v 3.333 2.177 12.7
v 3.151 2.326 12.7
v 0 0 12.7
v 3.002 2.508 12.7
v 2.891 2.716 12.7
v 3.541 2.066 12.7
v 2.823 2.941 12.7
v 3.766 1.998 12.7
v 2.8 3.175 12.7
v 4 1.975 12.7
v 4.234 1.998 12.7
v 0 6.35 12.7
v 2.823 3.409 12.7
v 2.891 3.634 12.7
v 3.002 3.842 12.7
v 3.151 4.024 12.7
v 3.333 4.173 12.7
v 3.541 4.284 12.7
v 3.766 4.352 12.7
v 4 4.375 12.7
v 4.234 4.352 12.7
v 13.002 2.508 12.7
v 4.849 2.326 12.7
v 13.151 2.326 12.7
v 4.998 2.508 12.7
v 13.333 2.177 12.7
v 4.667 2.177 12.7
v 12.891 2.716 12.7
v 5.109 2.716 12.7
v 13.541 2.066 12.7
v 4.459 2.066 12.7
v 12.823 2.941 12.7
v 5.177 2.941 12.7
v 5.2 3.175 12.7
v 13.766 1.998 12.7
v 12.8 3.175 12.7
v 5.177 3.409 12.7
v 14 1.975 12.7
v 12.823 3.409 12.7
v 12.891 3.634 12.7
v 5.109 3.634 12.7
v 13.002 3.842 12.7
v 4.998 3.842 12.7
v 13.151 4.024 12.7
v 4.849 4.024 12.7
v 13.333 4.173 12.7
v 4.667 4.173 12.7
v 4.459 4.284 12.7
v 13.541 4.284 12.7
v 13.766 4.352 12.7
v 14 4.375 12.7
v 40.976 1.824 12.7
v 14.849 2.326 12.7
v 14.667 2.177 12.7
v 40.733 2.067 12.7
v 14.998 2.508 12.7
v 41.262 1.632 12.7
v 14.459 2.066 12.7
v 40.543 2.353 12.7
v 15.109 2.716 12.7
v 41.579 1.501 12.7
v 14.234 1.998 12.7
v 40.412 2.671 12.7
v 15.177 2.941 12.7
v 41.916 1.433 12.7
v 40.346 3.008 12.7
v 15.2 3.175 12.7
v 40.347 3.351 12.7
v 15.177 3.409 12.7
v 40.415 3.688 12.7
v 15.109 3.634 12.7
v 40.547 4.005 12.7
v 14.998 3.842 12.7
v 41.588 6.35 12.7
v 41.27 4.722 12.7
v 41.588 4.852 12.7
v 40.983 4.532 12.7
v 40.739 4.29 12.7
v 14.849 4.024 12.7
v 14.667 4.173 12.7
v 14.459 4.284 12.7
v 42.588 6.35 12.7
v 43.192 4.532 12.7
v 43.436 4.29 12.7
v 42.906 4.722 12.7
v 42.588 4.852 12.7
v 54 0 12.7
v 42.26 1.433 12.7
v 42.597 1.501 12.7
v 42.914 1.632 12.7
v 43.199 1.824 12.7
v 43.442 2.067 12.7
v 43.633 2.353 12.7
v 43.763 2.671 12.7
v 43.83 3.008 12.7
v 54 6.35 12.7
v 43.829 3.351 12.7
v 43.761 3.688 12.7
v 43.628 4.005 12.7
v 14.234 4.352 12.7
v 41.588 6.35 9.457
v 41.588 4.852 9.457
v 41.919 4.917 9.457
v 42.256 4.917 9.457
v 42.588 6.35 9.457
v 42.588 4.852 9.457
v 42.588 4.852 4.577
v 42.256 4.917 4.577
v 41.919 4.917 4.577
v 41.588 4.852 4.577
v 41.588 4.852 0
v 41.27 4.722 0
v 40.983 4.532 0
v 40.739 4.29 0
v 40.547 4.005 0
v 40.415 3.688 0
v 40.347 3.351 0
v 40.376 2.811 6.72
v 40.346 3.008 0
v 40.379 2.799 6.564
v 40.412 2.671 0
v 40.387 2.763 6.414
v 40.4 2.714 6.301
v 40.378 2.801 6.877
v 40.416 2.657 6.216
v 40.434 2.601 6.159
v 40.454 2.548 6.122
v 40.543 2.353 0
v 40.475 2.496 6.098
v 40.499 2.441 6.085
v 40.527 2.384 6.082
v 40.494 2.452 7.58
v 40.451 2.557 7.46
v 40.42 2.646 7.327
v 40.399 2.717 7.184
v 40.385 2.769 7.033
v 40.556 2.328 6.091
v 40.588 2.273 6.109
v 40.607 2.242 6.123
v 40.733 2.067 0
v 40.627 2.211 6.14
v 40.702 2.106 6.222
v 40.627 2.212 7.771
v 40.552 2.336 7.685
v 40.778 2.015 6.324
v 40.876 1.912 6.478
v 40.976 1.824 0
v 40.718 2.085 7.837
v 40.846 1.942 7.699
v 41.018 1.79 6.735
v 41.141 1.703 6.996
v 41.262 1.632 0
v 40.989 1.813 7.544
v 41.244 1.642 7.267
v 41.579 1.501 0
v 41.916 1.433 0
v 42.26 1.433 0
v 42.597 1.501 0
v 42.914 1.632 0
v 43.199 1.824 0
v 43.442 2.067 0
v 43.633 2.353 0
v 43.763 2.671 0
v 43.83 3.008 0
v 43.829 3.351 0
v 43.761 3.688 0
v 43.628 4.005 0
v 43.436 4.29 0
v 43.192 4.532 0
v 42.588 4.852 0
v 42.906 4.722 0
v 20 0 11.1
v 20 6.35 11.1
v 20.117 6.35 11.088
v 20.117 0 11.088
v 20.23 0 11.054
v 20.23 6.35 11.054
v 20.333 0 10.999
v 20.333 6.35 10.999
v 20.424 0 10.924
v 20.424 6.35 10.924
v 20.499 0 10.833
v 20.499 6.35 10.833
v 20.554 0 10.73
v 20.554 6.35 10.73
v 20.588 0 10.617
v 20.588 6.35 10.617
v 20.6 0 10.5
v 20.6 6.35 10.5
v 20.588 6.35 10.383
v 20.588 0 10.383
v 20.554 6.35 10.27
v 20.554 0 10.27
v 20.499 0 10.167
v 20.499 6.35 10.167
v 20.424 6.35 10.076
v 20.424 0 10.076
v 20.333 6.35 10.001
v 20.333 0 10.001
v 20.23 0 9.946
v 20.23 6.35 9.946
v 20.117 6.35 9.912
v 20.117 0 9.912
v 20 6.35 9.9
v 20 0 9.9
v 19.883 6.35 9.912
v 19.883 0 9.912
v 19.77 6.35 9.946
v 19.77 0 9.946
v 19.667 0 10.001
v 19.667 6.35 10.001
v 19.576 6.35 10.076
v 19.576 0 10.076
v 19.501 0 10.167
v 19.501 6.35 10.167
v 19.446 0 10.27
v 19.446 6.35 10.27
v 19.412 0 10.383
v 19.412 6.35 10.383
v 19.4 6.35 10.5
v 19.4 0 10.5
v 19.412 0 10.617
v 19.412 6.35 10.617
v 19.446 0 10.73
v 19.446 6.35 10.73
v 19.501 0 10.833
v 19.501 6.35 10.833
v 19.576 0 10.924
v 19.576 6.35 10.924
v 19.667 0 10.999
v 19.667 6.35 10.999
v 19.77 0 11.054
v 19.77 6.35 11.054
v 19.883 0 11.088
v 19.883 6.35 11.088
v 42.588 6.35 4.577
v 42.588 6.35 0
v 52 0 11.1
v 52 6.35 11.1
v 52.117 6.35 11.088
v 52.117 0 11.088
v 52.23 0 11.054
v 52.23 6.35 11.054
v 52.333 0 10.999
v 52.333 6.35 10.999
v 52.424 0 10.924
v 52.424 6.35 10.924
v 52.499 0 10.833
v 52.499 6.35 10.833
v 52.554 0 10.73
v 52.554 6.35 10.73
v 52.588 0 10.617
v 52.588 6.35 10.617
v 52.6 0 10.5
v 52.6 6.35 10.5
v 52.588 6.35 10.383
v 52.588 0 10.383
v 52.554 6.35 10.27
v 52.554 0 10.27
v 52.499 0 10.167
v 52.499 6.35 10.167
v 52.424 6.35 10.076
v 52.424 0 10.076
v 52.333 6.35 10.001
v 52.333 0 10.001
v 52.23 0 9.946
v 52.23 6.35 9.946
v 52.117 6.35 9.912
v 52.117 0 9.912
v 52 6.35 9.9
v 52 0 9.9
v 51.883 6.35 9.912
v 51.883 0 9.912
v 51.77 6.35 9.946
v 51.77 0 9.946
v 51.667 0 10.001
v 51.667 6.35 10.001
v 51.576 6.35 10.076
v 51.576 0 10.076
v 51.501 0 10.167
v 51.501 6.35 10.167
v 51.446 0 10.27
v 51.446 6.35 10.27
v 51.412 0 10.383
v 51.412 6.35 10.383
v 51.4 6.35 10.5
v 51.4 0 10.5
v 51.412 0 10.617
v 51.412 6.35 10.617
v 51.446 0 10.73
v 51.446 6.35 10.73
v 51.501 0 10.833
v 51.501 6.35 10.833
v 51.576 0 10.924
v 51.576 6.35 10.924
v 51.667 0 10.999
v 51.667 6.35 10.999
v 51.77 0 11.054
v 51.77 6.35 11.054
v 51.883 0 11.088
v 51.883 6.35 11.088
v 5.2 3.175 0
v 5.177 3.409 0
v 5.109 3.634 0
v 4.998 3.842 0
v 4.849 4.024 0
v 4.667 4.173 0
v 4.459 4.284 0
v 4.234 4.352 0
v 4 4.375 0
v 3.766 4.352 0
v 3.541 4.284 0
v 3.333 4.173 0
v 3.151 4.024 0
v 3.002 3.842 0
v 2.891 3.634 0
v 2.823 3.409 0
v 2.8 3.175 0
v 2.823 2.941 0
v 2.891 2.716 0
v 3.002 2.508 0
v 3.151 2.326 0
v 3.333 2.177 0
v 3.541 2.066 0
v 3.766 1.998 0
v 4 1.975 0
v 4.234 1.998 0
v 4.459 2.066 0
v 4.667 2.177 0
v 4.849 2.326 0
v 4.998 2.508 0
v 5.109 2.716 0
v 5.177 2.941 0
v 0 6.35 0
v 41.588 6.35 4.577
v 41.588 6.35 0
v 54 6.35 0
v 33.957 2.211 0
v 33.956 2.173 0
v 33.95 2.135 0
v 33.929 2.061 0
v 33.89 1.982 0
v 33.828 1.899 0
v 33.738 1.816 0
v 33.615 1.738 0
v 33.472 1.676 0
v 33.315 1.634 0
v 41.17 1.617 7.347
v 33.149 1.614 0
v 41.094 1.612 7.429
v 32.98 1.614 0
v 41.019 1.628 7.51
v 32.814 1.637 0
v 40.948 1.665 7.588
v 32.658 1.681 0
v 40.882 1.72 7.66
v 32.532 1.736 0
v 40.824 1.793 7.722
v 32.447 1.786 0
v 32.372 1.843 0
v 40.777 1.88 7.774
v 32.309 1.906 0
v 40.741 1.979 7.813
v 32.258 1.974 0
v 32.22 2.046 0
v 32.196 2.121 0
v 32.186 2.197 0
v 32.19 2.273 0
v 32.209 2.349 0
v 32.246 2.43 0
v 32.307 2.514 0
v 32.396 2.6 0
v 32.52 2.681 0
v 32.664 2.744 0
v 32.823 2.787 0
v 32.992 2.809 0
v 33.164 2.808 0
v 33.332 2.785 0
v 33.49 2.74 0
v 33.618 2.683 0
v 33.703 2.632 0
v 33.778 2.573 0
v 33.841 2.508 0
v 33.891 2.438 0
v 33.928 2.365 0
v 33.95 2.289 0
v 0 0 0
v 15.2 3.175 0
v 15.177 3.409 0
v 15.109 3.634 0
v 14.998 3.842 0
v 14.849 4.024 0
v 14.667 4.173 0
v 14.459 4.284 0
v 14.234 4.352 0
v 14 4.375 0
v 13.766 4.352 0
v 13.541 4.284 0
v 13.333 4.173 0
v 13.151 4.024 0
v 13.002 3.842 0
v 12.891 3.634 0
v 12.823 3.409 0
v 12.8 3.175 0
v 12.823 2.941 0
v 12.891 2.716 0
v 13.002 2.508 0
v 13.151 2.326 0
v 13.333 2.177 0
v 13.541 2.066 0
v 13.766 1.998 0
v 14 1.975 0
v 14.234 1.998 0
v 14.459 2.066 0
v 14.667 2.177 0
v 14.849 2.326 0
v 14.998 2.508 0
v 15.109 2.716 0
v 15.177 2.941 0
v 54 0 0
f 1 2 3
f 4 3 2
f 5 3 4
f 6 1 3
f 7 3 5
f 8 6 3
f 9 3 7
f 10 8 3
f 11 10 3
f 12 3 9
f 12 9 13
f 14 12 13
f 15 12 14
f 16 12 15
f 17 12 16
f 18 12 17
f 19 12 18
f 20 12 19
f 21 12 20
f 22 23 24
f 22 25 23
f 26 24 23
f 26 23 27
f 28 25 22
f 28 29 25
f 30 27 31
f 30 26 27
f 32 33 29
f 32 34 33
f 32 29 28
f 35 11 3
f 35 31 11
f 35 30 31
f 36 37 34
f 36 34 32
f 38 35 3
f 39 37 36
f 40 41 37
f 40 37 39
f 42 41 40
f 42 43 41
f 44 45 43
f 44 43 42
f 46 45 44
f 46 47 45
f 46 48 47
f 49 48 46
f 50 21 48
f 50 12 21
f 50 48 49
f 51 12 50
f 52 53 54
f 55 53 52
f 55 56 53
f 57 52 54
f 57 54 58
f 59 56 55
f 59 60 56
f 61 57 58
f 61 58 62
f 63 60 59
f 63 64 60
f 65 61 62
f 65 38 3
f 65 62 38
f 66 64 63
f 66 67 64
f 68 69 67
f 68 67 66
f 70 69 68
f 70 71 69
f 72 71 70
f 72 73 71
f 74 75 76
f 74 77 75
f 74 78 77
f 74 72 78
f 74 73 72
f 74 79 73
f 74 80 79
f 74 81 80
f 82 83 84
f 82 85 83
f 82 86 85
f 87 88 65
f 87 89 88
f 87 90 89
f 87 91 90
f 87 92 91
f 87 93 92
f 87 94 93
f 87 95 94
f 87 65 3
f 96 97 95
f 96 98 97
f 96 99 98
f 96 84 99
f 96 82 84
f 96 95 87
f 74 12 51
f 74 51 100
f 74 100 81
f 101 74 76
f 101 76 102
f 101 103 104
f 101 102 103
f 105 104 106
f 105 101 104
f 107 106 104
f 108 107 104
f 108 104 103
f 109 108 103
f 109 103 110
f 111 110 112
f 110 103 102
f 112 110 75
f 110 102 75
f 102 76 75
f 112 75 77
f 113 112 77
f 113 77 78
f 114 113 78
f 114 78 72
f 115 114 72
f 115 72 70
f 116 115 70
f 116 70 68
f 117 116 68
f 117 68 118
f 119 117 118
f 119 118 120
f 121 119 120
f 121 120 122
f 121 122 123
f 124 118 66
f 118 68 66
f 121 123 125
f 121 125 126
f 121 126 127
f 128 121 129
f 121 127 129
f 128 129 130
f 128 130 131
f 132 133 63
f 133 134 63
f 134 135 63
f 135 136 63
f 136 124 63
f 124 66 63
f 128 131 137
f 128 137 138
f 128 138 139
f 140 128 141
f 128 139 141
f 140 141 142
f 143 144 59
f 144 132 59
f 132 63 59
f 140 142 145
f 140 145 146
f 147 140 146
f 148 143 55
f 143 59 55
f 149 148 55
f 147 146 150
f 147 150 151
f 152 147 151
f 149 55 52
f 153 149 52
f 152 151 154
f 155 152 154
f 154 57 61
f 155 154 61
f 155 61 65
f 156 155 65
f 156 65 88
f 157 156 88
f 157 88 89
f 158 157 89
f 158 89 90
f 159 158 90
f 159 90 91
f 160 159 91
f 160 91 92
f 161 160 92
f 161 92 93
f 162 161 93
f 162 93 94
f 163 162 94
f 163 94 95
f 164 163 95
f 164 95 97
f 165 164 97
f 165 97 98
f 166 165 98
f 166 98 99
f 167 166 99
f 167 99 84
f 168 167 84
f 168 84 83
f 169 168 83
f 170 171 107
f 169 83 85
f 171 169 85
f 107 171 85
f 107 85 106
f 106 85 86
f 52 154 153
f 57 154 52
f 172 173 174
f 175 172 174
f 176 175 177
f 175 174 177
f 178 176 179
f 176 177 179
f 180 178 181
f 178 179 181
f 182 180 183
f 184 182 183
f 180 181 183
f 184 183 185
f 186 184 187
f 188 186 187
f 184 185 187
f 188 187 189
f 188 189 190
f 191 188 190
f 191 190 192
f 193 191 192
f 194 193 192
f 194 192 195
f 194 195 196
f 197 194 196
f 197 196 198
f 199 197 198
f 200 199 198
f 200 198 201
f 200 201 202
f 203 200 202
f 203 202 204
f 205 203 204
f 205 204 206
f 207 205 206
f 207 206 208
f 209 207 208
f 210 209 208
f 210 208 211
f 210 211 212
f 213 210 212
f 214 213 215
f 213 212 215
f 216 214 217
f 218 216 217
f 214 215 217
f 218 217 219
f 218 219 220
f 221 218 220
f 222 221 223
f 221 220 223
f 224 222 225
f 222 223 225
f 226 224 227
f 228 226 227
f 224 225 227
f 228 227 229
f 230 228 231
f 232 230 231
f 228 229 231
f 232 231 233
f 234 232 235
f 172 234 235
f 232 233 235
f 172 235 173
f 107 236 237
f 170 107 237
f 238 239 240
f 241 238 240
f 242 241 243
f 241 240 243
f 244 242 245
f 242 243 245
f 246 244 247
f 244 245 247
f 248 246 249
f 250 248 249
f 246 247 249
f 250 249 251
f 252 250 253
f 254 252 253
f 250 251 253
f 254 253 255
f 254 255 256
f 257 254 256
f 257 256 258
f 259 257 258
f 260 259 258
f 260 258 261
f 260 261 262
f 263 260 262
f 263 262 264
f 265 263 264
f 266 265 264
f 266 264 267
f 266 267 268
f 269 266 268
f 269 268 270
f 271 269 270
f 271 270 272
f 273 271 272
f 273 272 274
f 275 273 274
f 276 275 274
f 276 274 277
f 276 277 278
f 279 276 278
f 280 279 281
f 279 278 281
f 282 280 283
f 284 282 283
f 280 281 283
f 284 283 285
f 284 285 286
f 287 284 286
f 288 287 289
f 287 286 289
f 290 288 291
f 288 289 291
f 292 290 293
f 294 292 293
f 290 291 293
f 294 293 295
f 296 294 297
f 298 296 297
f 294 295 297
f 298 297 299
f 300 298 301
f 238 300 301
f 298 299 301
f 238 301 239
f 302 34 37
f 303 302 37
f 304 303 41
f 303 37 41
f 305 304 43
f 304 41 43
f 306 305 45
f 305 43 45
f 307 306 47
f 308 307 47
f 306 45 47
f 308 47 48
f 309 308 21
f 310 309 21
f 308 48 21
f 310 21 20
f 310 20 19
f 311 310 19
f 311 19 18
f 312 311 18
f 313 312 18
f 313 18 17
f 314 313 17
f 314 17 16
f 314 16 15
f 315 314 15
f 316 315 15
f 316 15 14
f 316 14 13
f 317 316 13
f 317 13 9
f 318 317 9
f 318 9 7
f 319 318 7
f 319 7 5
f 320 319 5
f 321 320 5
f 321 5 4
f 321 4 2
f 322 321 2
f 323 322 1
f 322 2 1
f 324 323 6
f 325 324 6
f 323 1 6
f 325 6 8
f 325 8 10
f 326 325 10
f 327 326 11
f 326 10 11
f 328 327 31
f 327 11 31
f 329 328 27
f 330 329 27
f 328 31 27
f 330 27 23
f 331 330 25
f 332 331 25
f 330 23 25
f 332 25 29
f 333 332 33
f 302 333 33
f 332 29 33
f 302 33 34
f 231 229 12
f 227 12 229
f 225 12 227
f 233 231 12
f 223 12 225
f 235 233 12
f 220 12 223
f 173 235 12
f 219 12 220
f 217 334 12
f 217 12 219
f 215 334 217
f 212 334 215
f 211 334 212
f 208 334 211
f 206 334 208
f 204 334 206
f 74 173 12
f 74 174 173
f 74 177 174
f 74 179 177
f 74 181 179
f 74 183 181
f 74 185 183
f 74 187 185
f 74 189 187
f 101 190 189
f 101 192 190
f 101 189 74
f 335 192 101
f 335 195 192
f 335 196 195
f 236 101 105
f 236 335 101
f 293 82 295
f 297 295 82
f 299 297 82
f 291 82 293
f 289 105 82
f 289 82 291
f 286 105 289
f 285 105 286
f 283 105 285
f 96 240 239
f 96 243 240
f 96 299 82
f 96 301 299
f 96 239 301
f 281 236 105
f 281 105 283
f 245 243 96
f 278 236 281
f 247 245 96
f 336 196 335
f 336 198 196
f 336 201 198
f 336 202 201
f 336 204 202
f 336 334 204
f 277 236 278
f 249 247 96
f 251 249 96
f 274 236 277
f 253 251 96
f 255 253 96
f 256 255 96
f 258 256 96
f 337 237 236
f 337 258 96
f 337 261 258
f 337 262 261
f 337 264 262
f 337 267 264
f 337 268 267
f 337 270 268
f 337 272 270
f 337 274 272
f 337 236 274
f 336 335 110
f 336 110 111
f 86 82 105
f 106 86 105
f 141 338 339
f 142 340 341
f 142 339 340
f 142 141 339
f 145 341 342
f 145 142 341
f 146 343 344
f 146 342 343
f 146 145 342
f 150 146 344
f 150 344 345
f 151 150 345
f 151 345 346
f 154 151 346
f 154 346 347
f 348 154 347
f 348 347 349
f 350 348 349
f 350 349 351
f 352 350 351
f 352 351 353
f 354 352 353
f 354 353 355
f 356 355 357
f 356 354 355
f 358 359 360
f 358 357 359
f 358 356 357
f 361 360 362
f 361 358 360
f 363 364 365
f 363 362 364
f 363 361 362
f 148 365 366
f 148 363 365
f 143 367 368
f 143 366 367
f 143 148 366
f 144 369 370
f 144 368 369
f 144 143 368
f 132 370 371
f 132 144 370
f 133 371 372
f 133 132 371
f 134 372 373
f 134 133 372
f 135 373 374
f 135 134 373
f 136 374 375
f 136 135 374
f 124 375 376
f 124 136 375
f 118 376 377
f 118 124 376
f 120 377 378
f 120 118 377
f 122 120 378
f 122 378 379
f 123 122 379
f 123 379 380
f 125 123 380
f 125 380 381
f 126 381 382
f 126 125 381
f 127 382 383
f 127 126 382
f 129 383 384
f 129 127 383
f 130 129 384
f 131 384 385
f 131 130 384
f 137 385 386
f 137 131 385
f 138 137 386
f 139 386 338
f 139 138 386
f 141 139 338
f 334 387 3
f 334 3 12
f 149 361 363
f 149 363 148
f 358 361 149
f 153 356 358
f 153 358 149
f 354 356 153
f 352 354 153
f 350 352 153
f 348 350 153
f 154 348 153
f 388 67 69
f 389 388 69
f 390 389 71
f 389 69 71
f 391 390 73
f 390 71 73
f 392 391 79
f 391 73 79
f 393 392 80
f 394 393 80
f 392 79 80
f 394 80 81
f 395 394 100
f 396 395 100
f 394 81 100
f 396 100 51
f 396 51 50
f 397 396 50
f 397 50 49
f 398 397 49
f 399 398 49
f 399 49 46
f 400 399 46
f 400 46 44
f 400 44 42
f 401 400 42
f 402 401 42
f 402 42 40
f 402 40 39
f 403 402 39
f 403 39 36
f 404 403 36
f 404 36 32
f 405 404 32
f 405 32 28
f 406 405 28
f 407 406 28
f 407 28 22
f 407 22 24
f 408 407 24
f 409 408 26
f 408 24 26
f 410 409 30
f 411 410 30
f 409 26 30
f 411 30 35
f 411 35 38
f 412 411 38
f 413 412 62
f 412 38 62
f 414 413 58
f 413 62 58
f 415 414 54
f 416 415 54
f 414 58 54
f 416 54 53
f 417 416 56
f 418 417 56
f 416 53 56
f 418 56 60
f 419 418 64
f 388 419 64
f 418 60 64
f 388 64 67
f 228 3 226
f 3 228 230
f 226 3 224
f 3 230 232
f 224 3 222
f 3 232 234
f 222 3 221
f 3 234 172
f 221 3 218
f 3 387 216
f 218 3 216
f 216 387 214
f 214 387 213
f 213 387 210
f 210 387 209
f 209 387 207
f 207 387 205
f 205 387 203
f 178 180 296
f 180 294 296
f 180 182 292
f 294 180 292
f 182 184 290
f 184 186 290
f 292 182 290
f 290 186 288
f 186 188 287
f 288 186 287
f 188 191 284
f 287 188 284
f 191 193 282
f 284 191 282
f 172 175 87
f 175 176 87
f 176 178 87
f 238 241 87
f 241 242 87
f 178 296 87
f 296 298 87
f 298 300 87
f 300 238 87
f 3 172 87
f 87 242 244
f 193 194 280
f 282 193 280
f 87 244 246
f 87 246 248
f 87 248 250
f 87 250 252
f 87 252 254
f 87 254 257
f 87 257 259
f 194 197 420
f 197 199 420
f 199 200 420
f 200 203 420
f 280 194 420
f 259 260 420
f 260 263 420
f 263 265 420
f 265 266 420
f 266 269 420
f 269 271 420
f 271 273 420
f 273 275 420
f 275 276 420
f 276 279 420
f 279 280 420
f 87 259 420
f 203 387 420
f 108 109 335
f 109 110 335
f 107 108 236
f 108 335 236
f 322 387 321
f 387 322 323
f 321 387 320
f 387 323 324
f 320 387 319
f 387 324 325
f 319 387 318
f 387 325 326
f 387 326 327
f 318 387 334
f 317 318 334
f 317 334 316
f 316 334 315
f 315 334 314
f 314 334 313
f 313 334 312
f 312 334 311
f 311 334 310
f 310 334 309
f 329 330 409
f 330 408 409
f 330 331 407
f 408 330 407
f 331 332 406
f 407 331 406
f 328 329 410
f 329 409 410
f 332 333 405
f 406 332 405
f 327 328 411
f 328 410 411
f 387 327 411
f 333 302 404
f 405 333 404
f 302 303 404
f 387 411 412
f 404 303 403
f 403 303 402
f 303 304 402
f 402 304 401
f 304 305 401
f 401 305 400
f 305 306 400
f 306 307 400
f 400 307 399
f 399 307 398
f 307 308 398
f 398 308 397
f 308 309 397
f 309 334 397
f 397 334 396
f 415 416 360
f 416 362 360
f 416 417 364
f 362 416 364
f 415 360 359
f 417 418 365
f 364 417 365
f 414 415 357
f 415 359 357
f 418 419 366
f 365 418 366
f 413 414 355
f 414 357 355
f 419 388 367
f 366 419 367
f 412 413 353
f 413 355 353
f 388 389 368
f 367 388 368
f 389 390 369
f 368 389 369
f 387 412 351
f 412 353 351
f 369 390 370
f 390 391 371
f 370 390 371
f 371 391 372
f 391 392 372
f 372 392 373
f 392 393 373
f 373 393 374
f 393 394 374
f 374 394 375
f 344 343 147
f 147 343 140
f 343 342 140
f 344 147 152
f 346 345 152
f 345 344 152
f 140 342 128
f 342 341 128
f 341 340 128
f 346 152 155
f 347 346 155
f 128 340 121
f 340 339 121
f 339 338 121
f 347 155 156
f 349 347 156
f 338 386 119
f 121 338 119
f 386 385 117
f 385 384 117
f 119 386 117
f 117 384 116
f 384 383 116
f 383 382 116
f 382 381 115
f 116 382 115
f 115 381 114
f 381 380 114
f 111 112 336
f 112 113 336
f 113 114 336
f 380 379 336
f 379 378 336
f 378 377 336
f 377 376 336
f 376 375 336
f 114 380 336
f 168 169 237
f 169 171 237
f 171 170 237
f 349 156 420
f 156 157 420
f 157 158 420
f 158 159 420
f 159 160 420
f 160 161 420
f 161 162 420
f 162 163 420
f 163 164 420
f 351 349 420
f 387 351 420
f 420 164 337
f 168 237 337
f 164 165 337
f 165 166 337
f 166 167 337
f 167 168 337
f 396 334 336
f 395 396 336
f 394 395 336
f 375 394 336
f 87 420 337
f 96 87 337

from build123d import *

# Parameters (mm, degrees)
SKETCH1_W           = 54
SKETCH1_H           = 6.35
BOSS_EXTRUDE1_DEPTH = 12.7
SKETCH3_W           = 1
SKETCH3_H           = 3.243111396
SKETCH3_H_2         = 4.577374163
CUT_EXTRUDE1_DEPTH  = 2
SKETCH4_R           = 1.75
CUT_EXTRUDE2_DEPTH  = 56.835584532
SKETCH5_R           = 0.6
CUT_EXTRUDE3_DEPTH  = 56.835584532
SKETCH6_R           = 1.2
CUT_EXTRUDE4_DEPTH  = 56.835584532
SKETCH12_R          = 0.6
CUT_EXTRUDE6_DEPTH  = 15


with BuildPart() as part:
    # Sketch1 → Boss-Extrude1 (new body)
    with BuildSketch(Plane.XY):
        with Locations((27, 3.175)):
            Rectangle(SKETCH1_W, SKETCH1_H)
    extrude(amount=BOSS_EXTRUDE1_DEPTH)

    # Sketch3 → Cut-Extrude1 (cut)
    with BuildSketch(Plane(origin=(0, 6.35, 0), x_dir=(1, 0, 0), z_dir=(0, 1, 0))):
        with Locations((42.087715046, -11.078444302)):
            Rectangle(SKETCH3_W, SKETCH3_H)
        with Locations((42.087715046, -2.288687081)):
            Rectangle(SKETCH3_W, SKETCH3_H_2)
    extrude(amount=-CUT_EXTRUDE1_DEPTH, mode=Mode.SUBTRACT)

    # Sketch4 → Cut-Extrude2 (cut, through all)
    with BuildSketch(Plane.XY.offset(12.7)):
        with Locations(Location((42.087715046, 3.175, 0), (0, 0, 73.398450401))):
            Circle(SKETCH4_R)
    extrude(amount=-CUT_EXTRUDE2_DEPTH, mode=Mode.SUBTRACT)

    # Sketch5 → Cut-Extrude3 (cut, through all)
    with BuildSketch(Plane(origin=(0, 6.35, 0), x_dir=(1, 0, 0), z_dir=(0, 1, 0))):
        with Locations(Location((52, -10.5, 0), (0, 0, 270))):
            Circle(SKETCH5_R)
        with Locations(Location((20, -10.5, 0), (0, 0, 270))):
            Circle(SKETCH5_R)
    extrude(amount=-CUT_EXTRUDE3_DEPTH, mode=Mode.SUBTRACT)

    # Sketch6 → Cut-Extrude4 (cut, through all)
    with BuildSketch(Plane.XY.offset(12.7)):
        with Locations((4, 3.175)):
            Circle(SKETCH6_R)
        with Locations((14, 3.175)):
            Circle(SKETCH6_R)
    extrude(amount=-CUT_EXTRUDE4_DEPTH, mode=Mode.SUBTRACT)

    # Sketch12 → Cut-Extrude6 (cut)
    with BuildSketch(Plane(origin=(25.944559134, 0, 23.885086629), x_dir=(-0.677303634830695, 0, 0.7357035994509805), z_dir=(-0.7357035994509805, 0, -0.677303634830695))):
        with Locations(Location((-22.399423471, 2.211286905, 0), (0, 0, 180))):
            Circle(SKETCH12_R)
    extrude(amount=CUT_EXTRUDE6_DEPTH, mode=Mode.SUBTRACT)


solid = part.part
